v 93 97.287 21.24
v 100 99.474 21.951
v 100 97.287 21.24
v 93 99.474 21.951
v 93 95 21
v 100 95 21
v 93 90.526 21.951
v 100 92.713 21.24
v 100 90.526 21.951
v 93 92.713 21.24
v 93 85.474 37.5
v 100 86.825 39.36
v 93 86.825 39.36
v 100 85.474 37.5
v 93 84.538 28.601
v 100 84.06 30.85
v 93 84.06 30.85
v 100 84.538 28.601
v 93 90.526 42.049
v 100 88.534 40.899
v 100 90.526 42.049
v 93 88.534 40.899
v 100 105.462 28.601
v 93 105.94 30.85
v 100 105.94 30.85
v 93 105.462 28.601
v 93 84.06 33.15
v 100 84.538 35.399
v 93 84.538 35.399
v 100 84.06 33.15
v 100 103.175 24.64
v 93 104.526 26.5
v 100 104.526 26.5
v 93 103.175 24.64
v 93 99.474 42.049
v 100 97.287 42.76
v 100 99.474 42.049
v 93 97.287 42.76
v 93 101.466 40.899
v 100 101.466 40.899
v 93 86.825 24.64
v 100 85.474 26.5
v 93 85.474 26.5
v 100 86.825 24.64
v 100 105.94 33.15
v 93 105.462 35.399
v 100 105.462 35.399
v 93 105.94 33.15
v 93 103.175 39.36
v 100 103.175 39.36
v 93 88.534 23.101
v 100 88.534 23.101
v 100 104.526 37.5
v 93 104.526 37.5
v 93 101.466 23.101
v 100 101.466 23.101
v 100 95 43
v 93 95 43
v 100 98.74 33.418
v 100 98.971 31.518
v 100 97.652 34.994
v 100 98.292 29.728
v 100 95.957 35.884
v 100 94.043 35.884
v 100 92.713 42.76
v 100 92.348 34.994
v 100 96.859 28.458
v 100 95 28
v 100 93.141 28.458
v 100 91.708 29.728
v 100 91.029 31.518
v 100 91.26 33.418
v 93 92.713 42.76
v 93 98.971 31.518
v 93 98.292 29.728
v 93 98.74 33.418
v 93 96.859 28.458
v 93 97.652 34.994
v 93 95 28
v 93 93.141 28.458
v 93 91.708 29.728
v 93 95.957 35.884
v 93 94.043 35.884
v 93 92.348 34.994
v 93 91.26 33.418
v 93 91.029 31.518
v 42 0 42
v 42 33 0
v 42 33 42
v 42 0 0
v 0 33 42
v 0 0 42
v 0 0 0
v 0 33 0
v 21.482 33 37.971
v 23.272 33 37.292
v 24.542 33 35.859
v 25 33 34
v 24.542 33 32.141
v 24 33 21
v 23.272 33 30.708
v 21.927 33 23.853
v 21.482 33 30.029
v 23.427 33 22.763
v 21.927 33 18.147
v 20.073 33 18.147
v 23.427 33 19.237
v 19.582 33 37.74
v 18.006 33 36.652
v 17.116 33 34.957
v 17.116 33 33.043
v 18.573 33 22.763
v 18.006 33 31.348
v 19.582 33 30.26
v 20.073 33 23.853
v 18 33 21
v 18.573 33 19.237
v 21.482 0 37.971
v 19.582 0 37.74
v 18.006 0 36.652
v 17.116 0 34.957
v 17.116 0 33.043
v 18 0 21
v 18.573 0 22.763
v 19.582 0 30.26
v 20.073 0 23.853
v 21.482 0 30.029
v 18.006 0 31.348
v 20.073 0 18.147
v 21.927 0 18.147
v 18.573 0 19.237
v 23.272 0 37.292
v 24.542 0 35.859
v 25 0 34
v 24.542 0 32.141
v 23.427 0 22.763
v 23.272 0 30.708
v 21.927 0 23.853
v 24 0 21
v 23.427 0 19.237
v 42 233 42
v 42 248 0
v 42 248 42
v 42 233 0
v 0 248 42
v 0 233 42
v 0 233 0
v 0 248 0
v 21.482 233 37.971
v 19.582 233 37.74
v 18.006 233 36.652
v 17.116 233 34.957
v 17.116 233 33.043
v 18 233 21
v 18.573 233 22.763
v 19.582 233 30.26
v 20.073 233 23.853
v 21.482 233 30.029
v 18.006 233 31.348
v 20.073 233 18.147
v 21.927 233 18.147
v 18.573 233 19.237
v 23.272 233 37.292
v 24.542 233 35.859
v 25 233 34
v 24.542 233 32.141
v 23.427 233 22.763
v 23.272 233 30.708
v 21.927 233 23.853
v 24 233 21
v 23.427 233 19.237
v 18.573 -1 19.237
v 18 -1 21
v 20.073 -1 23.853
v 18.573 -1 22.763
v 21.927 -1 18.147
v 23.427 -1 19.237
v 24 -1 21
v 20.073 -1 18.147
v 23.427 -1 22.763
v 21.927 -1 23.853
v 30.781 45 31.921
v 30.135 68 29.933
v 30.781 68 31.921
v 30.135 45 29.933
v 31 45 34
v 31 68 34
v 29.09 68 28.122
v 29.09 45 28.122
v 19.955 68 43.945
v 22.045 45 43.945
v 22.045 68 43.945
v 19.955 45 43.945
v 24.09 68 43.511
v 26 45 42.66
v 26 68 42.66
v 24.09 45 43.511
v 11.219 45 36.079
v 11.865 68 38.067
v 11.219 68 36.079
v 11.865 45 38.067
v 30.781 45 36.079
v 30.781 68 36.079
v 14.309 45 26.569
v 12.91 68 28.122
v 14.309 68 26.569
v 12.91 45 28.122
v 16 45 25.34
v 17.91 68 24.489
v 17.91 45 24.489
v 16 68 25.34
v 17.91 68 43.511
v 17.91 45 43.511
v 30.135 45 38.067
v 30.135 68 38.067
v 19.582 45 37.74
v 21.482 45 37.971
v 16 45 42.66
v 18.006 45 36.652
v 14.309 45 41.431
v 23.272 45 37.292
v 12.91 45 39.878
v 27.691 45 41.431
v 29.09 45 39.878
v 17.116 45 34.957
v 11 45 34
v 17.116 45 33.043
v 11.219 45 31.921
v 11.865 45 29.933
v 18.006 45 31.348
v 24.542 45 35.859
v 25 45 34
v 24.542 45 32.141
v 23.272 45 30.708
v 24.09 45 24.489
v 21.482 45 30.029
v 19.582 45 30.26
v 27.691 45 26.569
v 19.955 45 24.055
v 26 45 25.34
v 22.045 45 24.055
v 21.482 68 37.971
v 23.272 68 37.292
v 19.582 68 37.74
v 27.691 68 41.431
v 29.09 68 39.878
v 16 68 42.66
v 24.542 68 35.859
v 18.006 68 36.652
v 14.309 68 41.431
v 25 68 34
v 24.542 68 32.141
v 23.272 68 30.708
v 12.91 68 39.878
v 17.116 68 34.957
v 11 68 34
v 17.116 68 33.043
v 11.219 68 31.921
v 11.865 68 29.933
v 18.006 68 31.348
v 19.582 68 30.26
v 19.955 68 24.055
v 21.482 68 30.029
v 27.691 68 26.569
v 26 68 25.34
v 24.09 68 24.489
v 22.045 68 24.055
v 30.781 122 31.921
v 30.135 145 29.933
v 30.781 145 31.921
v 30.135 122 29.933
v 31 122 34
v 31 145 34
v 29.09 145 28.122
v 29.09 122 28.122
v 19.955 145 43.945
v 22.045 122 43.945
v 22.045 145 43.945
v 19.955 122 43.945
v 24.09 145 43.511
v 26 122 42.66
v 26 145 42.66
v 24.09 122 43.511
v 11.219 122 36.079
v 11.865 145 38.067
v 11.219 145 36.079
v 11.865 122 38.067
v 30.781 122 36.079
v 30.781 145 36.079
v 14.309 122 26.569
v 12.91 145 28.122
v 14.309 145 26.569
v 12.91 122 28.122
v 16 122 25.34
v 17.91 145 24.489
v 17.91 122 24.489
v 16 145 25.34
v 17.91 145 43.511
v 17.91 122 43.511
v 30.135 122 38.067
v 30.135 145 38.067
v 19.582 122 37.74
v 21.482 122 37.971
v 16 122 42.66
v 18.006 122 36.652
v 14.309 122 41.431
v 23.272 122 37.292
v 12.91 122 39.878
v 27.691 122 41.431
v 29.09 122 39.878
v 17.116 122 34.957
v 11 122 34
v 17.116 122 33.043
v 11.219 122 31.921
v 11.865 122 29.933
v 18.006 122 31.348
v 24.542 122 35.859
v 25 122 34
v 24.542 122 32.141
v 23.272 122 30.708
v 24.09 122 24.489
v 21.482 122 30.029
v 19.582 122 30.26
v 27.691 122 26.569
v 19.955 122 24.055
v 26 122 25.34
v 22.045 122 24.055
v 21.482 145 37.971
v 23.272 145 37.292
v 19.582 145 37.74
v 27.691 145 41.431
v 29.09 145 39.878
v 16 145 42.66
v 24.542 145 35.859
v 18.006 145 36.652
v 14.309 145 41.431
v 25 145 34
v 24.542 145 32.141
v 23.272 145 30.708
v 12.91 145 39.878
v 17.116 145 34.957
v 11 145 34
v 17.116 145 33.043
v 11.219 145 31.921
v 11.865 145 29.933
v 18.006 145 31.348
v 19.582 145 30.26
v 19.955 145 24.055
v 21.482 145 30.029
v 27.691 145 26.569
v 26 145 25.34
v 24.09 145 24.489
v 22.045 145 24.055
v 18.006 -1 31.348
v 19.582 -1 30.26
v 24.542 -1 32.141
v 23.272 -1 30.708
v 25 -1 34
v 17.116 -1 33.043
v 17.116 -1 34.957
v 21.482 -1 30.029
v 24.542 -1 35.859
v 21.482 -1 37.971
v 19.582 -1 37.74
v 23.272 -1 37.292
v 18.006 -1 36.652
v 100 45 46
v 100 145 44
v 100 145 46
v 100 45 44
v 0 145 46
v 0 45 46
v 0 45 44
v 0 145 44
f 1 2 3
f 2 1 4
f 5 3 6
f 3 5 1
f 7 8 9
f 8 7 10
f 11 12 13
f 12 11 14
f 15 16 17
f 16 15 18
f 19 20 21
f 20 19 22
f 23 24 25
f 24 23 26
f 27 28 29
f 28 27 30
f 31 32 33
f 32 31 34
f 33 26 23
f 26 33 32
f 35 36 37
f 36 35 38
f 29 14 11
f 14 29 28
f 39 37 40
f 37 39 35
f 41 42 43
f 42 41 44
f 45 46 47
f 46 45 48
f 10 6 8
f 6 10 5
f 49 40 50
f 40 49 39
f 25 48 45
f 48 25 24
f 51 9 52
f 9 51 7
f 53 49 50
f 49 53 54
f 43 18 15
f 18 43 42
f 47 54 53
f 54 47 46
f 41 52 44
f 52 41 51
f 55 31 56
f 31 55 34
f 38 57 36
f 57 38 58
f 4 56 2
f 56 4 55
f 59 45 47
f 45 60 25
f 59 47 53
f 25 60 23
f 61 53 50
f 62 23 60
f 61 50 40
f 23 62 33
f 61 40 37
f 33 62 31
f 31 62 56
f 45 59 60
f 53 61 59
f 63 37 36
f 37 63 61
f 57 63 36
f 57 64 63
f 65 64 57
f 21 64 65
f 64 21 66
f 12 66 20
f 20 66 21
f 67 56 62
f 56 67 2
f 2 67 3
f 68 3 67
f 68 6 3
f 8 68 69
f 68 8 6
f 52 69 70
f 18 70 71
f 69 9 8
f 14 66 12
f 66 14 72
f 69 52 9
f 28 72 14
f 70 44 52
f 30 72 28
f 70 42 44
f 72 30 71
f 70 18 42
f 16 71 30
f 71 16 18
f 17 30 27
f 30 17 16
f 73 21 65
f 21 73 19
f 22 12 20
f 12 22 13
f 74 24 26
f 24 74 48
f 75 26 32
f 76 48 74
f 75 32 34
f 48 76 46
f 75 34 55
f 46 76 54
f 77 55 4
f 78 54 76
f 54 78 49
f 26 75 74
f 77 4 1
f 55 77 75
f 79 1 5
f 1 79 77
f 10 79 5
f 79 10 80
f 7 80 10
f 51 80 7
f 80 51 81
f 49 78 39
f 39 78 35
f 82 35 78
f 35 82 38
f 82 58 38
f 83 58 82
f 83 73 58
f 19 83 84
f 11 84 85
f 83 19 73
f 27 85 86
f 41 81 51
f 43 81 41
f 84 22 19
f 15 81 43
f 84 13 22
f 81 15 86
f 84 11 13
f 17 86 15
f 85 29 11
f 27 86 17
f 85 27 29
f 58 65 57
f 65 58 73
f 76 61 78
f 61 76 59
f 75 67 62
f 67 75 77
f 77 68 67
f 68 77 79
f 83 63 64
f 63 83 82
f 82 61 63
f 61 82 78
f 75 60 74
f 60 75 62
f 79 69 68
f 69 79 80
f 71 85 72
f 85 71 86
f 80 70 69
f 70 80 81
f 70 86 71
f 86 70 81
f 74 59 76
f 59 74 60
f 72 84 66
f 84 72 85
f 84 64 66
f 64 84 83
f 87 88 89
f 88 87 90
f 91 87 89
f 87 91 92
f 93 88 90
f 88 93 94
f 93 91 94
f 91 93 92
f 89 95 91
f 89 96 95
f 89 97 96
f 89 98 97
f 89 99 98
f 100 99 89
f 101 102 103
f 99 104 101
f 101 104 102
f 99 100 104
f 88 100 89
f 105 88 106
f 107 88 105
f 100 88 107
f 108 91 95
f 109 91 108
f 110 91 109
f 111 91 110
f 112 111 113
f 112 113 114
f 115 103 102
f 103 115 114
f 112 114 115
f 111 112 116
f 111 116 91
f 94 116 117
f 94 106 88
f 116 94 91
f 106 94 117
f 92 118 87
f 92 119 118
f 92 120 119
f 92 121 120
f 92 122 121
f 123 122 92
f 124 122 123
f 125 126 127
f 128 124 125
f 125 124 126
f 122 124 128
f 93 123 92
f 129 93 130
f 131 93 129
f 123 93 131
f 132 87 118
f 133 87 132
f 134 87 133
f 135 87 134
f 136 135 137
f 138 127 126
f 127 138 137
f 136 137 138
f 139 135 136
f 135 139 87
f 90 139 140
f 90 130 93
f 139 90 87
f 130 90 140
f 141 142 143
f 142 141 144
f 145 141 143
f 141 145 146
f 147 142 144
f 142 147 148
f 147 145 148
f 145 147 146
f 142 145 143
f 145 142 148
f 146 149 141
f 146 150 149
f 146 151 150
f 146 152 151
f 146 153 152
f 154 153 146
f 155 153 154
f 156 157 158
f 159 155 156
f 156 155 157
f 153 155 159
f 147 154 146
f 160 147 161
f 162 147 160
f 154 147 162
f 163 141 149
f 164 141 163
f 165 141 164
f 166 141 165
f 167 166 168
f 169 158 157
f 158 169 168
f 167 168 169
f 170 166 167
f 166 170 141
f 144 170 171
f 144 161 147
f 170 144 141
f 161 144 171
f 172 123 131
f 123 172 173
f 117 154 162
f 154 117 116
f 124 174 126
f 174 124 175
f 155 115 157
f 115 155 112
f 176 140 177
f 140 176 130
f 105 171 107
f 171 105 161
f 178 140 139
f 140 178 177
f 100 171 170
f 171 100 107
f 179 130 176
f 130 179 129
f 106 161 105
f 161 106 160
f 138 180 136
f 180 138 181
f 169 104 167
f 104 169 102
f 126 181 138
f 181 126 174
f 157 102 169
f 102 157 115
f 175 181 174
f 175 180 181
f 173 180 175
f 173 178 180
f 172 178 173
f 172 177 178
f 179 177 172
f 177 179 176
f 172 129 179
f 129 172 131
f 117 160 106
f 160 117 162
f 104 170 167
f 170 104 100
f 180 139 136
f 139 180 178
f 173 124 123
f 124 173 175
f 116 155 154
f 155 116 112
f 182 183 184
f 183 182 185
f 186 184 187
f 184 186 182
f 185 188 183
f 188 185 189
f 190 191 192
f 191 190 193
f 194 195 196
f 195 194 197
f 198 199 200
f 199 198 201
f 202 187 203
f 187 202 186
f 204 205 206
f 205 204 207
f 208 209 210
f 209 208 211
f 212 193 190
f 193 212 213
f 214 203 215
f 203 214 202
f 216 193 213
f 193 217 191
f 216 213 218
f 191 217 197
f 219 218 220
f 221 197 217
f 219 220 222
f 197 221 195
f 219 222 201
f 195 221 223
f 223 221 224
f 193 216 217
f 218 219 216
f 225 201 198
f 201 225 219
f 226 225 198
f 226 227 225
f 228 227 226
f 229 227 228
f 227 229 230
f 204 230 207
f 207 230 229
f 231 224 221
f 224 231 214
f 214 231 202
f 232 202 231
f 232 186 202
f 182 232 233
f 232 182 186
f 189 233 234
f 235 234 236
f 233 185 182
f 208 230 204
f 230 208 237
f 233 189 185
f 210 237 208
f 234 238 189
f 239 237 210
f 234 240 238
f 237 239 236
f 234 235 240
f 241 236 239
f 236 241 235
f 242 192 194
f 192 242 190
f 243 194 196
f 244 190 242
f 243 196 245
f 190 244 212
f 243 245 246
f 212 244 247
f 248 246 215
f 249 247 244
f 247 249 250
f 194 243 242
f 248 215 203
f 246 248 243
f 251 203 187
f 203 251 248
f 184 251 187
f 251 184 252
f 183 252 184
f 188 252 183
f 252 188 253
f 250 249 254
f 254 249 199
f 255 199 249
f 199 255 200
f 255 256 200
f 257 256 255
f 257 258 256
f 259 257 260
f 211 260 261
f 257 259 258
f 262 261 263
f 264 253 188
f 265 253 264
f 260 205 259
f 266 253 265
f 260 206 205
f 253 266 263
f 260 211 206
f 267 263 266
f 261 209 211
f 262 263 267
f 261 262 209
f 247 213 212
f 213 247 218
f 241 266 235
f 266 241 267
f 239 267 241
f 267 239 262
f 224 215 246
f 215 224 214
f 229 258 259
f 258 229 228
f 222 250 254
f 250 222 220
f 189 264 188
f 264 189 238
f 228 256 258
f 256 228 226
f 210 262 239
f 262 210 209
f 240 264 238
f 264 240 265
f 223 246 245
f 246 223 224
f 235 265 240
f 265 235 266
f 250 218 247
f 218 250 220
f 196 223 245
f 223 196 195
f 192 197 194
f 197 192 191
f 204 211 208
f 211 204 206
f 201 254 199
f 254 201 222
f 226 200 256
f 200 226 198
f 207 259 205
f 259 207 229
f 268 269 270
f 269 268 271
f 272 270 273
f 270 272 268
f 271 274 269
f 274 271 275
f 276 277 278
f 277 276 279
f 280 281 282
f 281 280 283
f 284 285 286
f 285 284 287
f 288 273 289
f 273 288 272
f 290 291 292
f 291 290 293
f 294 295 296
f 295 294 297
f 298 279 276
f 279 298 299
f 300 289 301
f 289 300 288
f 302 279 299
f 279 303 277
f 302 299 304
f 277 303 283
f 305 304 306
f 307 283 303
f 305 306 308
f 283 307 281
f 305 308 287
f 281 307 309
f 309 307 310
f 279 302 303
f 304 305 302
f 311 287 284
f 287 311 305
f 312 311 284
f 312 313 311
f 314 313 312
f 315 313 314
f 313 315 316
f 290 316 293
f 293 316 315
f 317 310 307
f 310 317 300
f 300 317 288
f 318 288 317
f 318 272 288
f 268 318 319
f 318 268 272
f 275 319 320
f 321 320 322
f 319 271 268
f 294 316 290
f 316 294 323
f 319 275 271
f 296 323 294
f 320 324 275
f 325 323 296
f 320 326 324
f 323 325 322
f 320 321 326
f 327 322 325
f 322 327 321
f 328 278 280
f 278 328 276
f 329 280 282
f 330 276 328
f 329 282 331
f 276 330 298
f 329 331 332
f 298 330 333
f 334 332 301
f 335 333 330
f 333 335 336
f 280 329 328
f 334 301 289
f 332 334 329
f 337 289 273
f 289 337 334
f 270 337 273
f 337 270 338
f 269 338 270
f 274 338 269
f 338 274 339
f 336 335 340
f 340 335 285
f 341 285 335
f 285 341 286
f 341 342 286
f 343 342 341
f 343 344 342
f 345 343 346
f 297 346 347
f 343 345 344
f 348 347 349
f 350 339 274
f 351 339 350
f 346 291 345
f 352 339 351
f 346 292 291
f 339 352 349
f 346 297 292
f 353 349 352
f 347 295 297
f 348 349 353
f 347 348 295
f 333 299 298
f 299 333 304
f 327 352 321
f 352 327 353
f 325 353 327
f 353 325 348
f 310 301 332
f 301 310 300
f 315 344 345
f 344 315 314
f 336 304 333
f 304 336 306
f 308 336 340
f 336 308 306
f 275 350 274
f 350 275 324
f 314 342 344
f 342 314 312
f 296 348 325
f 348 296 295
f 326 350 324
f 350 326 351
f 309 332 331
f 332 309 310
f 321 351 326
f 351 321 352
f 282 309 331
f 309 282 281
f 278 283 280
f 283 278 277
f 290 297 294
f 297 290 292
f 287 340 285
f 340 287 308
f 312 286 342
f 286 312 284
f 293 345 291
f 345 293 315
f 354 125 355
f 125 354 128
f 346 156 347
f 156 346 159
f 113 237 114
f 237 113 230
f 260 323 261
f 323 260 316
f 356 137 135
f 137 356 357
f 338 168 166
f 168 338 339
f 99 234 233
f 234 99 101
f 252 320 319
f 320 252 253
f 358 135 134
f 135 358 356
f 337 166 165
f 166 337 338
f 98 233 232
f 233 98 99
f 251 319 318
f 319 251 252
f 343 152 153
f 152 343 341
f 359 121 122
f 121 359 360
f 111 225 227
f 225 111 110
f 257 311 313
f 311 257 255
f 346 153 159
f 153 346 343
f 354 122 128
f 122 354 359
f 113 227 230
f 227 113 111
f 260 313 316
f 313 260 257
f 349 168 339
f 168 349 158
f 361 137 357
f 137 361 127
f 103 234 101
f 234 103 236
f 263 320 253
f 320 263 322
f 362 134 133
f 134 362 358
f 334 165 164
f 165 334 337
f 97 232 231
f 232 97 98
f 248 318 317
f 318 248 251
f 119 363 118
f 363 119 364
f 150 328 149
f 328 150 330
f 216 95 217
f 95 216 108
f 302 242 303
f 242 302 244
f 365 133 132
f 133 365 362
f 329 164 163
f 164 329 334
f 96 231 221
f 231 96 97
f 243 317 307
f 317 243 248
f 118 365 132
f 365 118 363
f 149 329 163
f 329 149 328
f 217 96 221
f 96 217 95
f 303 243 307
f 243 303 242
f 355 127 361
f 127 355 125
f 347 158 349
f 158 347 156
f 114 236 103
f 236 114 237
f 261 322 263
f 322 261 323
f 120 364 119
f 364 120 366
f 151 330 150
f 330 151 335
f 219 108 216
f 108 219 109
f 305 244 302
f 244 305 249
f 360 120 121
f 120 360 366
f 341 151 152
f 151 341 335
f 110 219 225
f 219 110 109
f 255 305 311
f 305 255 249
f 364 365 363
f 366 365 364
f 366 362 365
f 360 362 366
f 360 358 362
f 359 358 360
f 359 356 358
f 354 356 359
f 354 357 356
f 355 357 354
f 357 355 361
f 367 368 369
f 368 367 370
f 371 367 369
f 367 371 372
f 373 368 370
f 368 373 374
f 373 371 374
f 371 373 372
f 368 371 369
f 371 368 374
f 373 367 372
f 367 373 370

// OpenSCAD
color("red")cube([42,33,42]);
color("red")translate([0,33+200,0])cube([42,15,42]);
translate([21,-1,21])rotate([-90,0,0])cylinder(r=3,h=33+1+200);
color("teal")translate([21,45,34])rotate([-90,0,0])cylinder(r=10,h=23);
color("teal")translate([21,122,34])rotate([-90,0,0])cylinder(r=10,h=23);
color("gray")translate([21,-1,34])rotate([-90,0,0])cylinder(r=4,h=33+1+200);

translate([0,45,44])cube([100,100,2]);

color("gray")translate([100-7,45+50,32])rotate([0,90,0])difference(){cylinder(r=22/2,h=7);translate([0,0,-1])cylinder(r=8/2,h=20);}
